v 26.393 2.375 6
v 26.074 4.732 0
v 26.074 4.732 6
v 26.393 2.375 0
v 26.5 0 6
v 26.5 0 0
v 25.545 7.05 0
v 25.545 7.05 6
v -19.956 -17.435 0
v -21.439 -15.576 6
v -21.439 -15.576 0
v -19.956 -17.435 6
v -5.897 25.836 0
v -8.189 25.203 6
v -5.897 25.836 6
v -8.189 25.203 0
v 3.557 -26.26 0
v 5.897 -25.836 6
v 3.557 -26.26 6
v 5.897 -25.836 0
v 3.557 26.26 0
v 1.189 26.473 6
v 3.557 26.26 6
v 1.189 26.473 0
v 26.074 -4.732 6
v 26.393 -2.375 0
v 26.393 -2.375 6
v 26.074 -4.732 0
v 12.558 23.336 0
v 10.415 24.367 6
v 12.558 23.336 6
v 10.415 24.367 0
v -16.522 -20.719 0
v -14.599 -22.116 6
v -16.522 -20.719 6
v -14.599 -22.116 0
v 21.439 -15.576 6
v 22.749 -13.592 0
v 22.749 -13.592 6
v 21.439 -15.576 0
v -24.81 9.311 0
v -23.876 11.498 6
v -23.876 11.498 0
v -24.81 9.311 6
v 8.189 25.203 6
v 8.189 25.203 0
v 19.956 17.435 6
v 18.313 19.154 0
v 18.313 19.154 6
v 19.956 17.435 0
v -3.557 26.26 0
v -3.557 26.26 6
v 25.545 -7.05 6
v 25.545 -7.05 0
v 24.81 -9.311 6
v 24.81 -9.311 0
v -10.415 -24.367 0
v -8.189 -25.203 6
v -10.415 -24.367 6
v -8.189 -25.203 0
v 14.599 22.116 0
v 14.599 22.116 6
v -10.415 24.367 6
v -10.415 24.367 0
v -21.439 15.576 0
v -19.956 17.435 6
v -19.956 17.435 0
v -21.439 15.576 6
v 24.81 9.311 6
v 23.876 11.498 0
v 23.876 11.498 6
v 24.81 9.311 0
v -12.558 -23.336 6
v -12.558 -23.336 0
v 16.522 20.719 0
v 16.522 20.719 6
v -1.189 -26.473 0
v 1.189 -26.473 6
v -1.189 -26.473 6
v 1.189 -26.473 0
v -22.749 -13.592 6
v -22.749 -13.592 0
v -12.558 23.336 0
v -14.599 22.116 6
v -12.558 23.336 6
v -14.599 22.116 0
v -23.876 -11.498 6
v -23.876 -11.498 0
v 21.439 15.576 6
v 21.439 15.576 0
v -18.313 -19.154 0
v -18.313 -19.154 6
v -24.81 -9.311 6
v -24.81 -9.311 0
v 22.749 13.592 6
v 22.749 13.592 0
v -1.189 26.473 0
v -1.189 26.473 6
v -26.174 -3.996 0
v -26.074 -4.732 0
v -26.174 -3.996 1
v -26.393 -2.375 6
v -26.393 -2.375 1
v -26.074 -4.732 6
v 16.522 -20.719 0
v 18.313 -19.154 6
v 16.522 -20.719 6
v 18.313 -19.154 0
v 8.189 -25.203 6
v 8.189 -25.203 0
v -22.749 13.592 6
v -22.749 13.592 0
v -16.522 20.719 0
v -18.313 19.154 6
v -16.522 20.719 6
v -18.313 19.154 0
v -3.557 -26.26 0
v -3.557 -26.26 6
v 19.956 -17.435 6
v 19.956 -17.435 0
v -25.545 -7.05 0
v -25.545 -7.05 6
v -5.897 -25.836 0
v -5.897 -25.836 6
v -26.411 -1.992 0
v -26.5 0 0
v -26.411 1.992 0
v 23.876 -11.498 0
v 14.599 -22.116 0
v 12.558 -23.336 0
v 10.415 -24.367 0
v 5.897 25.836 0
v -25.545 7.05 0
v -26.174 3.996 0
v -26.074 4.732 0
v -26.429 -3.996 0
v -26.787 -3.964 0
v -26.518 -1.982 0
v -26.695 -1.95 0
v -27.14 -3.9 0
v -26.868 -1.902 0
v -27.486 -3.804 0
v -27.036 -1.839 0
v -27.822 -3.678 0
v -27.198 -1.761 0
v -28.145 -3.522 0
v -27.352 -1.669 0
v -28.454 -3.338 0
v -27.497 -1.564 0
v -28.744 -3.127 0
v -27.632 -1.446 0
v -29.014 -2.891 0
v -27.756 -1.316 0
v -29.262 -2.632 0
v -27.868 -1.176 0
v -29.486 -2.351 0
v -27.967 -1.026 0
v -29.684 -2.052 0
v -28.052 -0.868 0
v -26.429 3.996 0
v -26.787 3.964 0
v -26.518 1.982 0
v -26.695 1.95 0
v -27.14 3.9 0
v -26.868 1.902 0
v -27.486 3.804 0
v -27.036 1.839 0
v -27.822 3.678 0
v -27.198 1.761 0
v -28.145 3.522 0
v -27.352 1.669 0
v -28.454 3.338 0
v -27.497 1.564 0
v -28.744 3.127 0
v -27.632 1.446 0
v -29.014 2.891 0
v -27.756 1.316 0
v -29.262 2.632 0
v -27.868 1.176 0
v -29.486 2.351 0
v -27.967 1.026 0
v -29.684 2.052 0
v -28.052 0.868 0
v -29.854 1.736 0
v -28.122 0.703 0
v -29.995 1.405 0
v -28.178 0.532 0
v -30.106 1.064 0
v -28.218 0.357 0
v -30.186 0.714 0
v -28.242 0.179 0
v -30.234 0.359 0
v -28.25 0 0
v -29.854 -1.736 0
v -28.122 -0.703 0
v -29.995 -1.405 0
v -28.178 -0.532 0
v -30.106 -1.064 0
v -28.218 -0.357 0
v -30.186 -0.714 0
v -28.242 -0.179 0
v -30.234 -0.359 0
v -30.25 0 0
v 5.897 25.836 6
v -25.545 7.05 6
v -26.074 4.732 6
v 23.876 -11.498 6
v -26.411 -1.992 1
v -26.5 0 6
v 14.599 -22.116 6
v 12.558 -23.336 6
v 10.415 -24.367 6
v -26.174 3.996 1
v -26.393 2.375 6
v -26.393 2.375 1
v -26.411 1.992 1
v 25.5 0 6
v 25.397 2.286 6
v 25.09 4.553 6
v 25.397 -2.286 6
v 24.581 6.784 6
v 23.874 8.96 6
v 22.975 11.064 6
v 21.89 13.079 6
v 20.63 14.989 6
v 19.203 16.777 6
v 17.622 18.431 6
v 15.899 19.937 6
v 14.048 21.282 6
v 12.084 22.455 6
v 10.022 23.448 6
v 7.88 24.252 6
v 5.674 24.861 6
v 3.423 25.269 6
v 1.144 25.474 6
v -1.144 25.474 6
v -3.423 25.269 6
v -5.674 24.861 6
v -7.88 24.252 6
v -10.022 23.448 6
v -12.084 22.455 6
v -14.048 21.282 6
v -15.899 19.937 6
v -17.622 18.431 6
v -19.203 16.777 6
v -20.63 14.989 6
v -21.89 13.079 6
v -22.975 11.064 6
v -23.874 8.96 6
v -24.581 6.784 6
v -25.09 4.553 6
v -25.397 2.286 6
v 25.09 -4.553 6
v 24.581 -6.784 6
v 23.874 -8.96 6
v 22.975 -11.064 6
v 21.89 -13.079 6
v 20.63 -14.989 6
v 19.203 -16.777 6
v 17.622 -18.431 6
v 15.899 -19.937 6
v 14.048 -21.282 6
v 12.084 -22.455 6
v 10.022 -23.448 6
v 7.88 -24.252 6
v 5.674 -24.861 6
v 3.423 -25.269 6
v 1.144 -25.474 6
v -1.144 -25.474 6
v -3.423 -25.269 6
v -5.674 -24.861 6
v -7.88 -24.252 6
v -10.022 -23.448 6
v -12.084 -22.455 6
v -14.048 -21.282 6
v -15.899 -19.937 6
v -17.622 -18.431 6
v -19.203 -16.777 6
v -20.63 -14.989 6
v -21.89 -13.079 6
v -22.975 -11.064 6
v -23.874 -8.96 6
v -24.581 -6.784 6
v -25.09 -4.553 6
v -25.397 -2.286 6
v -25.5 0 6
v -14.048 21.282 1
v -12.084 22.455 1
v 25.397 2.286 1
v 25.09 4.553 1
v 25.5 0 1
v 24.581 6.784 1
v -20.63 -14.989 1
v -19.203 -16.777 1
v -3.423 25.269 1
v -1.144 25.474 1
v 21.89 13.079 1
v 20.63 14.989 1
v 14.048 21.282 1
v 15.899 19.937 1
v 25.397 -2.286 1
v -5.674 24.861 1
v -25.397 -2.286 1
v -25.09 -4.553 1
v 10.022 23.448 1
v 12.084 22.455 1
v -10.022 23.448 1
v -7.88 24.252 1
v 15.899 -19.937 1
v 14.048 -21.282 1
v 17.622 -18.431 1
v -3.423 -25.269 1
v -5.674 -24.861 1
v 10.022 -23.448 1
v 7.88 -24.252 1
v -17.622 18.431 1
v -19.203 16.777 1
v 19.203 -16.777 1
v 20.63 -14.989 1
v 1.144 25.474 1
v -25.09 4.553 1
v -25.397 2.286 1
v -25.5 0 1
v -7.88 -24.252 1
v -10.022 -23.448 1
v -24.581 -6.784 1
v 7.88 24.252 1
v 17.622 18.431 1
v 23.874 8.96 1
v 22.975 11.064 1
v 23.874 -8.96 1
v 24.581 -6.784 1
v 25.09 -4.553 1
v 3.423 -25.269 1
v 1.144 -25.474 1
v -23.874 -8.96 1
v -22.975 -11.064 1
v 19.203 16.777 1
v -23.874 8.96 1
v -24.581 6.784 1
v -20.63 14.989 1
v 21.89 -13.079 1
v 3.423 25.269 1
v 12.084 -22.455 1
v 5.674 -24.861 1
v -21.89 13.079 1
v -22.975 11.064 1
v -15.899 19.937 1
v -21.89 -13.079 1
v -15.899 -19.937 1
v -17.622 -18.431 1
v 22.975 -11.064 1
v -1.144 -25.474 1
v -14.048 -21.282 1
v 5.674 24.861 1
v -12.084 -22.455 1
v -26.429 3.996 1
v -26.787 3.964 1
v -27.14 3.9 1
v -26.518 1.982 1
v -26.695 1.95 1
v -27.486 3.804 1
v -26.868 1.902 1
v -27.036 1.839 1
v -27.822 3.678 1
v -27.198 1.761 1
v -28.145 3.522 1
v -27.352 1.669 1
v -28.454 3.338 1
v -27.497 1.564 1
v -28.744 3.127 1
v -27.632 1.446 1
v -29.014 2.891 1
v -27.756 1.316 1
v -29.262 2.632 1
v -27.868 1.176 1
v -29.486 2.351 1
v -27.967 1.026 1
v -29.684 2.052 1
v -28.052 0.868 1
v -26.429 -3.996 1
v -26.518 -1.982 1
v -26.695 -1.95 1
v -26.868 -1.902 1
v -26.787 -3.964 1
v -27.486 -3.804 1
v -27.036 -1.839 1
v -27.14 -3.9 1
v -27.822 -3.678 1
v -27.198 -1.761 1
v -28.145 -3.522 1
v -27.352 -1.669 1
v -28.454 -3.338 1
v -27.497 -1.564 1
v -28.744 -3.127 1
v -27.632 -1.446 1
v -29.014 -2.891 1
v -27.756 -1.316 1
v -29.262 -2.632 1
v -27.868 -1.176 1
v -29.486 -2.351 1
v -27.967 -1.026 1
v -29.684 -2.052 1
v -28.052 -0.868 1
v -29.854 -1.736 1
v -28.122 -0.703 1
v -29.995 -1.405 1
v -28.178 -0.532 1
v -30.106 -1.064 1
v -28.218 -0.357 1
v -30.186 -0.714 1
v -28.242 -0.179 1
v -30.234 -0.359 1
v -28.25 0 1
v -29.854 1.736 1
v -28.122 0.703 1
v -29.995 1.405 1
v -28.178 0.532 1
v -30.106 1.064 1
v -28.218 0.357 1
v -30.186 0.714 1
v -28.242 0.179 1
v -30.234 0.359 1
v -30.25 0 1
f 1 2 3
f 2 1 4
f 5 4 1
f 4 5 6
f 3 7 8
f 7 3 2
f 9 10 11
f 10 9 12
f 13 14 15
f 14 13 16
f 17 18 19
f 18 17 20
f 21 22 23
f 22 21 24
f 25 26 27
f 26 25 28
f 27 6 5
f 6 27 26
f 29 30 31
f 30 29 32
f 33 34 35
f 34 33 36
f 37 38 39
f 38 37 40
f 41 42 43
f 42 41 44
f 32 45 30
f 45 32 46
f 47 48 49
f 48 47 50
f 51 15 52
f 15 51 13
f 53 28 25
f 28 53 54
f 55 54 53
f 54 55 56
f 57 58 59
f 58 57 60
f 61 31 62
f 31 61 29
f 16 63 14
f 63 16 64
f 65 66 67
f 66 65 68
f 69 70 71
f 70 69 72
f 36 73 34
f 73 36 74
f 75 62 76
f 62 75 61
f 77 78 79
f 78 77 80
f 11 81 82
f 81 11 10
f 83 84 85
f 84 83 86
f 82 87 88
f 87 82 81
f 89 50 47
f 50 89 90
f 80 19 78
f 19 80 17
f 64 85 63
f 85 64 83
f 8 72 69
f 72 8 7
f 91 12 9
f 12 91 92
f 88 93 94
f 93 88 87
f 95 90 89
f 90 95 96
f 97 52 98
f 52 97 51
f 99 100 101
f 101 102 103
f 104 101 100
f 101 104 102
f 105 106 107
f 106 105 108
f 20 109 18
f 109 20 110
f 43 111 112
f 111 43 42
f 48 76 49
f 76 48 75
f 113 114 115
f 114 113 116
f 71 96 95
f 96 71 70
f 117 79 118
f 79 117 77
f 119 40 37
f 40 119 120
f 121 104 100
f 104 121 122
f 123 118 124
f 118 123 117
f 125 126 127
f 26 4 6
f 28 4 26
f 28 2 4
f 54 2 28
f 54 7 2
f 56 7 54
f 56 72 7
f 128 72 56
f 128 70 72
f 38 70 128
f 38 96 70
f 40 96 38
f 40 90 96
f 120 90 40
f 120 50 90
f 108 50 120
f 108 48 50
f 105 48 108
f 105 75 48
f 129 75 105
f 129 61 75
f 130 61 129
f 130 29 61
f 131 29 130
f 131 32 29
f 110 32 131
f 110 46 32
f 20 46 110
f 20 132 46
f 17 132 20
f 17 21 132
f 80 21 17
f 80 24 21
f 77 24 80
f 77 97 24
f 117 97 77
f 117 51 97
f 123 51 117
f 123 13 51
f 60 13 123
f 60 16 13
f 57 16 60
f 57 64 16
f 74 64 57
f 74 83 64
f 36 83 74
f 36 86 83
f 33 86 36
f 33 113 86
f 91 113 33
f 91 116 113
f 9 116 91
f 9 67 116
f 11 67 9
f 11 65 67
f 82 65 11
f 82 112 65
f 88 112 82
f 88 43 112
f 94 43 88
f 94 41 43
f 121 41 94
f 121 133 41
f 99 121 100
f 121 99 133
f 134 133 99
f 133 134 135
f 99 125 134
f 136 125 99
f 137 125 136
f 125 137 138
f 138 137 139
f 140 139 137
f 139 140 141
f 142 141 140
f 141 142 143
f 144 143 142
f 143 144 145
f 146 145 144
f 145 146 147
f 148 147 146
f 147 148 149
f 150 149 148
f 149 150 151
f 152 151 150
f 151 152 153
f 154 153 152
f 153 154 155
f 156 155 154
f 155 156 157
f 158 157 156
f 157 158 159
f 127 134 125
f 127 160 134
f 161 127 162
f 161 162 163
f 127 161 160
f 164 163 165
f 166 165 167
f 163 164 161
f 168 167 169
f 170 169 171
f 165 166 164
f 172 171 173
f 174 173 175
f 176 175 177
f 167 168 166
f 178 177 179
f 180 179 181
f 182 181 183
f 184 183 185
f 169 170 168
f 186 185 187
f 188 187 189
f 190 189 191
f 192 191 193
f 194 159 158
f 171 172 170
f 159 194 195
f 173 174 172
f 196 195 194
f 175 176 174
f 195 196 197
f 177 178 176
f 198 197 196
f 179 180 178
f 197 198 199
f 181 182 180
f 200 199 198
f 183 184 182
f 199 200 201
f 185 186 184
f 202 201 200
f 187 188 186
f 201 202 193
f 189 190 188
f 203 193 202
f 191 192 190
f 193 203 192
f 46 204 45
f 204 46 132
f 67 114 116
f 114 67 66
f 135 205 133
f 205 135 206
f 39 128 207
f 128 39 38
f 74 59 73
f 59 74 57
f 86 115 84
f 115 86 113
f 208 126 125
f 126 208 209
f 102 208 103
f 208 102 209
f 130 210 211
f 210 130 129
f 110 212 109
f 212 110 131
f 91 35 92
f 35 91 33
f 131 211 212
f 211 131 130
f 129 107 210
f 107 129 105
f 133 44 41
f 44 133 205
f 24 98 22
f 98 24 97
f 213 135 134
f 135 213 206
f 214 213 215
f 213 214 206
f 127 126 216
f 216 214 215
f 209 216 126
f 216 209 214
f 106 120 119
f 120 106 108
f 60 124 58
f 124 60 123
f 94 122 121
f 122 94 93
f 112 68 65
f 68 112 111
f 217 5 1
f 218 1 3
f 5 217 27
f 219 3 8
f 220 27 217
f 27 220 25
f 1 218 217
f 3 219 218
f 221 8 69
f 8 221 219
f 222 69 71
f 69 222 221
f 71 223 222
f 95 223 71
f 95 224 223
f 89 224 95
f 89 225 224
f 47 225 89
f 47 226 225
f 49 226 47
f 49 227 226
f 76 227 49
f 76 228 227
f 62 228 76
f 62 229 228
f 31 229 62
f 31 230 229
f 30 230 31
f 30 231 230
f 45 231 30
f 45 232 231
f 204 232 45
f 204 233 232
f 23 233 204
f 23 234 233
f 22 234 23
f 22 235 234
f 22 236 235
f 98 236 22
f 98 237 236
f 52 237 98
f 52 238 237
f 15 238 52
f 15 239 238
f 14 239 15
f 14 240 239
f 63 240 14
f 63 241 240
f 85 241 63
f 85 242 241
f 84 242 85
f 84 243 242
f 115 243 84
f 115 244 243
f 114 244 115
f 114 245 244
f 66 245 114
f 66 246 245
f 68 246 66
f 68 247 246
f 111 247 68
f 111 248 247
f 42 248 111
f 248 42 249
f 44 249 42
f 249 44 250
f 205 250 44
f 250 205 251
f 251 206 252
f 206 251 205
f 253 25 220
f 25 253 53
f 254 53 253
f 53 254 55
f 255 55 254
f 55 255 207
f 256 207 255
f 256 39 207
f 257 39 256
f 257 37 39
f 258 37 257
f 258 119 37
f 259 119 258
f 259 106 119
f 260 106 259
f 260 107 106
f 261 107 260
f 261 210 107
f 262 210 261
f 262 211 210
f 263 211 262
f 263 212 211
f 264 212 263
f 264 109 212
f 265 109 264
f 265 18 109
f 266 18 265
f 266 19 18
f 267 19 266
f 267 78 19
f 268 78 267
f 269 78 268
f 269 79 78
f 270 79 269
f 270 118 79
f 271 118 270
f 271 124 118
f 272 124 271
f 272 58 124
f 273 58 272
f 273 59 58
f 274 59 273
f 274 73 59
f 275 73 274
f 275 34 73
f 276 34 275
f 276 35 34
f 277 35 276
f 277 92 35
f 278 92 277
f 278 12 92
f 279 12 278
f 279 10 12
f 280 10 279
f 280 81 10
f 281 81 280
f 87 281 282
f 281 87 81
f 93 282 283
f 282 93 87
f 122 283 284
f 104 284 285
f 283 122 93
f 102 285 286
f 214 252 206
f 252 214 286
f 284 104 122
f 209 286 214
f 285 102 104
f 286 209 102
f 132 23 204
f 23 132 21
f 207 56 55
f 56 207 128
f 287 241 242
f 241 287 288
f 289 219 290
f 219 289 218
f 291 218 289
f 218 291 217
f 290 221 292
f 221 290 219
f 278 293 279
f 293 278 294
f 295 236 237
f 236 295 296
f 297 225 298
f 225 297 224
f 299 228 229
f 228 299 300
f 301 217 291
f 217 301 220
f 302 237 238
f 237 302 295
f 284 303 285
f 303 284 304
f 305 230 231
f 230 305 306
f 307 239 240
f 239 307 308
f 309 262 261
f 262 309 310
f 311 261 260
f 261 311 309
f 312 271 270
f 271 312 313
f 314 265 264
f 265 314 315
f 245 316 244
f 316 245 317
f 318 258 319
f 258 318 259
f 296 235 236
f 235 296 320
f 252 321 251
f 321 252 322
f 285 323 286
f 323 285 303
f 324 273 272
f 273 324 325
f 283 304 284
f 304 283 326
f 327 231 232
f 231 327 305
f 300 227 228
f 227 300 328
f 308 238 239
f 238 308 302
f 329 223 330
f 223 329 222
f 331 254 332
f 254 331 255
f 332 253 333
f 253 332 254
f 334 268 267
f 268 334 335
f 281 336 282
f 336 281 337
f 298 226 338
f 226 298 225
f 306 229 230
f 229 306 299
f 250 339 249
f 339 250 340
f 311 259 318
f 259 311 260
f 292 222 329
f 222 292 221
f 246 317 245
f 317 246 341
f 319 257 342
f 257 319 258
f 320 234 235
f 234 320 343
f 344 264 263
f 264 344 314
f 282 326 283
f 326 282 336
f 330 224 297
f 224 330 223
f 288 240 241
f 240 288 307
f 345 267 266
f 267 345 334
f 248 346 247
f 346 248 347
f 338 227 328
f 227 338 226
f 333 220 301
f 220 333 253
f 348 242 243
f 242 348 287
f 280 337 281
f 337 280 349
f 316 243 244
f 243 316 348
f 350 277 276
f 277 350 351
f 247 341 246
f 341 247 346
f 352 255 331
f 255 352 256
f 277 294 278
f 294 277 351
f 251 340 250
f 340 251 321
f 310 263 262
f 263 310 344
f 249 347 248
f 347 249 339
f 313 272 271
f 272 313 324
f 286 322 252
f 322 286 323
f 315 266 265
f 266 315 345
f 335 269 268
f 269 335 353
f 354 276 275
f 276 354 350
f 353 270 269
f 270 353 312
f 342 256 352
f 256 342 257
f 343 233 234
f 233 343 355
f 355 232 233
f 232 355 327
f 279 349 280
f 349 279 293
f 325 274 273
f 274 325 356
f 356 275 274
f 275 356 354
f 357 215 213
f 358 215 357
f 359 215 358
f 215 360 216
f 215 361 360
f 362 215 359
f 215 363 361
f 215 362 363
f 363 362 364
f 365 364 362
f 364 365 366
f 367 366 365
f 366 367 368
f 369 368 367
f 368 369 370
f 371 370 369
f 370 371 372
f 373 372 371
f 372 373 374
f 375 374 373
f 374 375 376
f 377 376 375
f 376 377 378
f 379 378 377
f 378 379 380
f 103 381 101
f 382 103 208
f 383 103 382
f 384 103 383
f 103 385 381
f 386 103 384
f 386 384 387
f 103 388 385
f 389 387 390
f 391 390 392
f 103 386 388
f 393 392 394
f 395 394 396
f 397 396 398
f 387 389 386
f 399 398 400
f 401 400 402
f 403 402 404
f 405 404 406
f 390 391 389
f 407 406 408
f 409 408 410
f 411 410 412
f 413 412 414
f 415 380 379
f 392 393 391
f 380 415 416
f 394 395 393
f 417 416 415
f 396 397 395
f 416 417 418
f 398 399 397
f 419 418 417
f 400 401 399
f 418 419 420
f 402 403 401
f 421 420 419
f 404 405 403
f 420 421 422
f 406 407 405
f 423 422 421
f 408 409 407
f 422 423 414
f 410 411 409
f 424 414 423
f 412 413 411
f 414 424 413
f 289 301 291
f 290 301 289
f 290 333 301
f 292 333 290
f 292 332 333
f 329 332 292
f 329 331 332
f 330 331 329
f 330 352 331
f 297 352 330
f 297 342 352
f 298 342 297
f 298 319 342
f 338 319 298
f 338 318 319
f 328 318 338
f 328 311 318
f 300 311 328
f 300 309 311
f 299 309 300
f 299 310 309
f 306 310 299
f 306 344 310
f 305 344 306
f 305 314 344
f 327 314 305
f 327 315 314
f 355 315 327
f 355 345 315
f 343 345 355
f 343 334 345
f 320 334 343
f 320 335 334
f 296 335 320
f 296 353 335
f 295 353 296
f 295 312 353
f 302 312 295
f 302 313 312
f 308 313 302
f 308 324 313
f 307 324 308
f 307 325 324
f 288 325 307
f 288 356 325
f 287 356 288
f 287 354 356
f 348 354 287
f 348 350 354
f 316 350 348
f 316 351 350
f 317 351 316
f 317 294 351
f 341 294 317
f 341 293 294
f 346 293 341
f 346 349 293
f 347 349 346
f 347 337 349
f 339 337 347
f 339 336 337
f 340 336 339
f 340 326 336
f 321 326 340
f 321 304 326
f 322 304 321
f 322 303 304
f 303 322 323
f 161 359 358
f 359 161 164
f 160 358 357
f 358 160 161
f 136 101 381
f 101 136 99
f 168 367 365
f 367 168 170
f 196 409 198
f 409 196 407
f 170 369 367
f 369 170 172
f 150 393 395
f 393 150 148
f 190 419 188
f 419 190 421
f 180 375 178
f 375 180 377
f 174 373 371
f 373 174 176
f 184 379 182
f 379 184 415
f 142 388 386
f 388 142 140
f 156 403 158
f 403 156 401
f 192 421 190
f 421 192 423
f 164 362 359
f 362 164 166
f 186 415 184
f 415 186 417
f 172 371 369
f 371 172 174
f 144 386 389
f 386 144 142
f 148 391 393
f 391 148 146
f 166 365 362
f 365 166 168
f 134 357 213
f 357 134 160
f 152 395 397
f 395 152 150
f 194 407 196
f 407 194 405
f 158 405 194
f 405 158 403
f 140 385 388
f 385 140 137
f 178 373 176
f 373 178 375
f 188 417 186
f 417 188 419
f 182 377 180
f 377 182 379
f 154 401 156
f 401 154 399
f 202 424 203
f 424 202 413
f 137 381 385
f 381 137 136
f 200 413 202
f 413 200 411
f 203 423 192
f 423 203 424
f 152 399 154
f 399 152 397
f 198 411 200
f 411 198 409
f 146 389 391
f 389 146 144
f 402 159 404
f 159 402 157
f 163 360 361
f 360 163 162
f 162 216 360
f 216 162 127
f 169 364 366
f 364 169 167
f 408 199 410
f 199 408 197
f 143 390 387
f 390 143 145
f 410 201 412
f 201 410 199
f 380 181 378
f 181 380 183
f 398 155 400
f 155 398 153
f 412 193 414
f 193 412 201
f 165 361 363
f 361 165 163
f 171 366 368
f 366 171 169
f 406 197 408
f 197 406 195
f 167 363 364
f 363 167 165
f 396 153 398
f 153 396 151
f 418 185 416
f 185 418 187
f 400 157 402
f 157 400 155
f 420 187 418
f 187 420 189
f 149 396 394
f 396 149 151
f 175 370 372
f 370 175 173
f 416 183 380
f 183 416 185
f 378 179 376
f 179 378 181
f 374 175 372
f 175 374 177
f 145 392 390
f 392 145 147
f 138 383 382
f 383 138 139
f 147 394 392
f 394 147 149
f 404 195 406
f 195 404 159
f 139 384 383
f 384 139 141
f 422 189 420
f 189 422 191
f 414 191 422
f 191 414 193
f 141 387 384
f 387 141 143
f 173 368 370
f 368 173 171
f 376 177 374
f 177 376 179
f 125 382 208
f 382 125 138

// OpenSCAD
//Parameterised push on lens cap
// Glyn Cowles July 2014
// Added option to have a place for a tether
// Scott Hergott September 2014

//Thickness of sides
thickness=1;//[1:5] 
//Inside diameter
idiam=51;//[10:200]   
//Height
lidh=6;//[2:20]
//Looseness factor (5 = extra .5mm + diameter)
looseness=0;//[0:20]
// Toggle for tether
doTether= "true"; // ["true","false"]

/* [Hidden] */
$fn=70;
loose=looseness/10; // ie looseness = 5 loose = 0.5mm


lid(); 

//-----------------------------------------------------------------------
module tube(d,h,th) {  // d= outside diam
rad=d/2;
difference() {
	cylinder(h=h,r=rad);
	cylinder(h=h,r=rad-th);
	}
}

module tether( edge ) {
translate([-(edge+1)/2, 0, 0])
difference() {
	cylinder(h=thickness,r=4, center=false);
	cylinder(h=thickness,r=2, center=false);
	}
}

//-----------------------------------------------------------------------

module lid(){
union() {
	tube(idiam+thickness*2+loose,lidh,thickness); // sides
	tube(idiam+thickness*2+loose,thickness,idiam+thickness*2+loose); // base
	if (doTether)
	{
		tether(idiam+thickness/2+loose);
	}
}
}



